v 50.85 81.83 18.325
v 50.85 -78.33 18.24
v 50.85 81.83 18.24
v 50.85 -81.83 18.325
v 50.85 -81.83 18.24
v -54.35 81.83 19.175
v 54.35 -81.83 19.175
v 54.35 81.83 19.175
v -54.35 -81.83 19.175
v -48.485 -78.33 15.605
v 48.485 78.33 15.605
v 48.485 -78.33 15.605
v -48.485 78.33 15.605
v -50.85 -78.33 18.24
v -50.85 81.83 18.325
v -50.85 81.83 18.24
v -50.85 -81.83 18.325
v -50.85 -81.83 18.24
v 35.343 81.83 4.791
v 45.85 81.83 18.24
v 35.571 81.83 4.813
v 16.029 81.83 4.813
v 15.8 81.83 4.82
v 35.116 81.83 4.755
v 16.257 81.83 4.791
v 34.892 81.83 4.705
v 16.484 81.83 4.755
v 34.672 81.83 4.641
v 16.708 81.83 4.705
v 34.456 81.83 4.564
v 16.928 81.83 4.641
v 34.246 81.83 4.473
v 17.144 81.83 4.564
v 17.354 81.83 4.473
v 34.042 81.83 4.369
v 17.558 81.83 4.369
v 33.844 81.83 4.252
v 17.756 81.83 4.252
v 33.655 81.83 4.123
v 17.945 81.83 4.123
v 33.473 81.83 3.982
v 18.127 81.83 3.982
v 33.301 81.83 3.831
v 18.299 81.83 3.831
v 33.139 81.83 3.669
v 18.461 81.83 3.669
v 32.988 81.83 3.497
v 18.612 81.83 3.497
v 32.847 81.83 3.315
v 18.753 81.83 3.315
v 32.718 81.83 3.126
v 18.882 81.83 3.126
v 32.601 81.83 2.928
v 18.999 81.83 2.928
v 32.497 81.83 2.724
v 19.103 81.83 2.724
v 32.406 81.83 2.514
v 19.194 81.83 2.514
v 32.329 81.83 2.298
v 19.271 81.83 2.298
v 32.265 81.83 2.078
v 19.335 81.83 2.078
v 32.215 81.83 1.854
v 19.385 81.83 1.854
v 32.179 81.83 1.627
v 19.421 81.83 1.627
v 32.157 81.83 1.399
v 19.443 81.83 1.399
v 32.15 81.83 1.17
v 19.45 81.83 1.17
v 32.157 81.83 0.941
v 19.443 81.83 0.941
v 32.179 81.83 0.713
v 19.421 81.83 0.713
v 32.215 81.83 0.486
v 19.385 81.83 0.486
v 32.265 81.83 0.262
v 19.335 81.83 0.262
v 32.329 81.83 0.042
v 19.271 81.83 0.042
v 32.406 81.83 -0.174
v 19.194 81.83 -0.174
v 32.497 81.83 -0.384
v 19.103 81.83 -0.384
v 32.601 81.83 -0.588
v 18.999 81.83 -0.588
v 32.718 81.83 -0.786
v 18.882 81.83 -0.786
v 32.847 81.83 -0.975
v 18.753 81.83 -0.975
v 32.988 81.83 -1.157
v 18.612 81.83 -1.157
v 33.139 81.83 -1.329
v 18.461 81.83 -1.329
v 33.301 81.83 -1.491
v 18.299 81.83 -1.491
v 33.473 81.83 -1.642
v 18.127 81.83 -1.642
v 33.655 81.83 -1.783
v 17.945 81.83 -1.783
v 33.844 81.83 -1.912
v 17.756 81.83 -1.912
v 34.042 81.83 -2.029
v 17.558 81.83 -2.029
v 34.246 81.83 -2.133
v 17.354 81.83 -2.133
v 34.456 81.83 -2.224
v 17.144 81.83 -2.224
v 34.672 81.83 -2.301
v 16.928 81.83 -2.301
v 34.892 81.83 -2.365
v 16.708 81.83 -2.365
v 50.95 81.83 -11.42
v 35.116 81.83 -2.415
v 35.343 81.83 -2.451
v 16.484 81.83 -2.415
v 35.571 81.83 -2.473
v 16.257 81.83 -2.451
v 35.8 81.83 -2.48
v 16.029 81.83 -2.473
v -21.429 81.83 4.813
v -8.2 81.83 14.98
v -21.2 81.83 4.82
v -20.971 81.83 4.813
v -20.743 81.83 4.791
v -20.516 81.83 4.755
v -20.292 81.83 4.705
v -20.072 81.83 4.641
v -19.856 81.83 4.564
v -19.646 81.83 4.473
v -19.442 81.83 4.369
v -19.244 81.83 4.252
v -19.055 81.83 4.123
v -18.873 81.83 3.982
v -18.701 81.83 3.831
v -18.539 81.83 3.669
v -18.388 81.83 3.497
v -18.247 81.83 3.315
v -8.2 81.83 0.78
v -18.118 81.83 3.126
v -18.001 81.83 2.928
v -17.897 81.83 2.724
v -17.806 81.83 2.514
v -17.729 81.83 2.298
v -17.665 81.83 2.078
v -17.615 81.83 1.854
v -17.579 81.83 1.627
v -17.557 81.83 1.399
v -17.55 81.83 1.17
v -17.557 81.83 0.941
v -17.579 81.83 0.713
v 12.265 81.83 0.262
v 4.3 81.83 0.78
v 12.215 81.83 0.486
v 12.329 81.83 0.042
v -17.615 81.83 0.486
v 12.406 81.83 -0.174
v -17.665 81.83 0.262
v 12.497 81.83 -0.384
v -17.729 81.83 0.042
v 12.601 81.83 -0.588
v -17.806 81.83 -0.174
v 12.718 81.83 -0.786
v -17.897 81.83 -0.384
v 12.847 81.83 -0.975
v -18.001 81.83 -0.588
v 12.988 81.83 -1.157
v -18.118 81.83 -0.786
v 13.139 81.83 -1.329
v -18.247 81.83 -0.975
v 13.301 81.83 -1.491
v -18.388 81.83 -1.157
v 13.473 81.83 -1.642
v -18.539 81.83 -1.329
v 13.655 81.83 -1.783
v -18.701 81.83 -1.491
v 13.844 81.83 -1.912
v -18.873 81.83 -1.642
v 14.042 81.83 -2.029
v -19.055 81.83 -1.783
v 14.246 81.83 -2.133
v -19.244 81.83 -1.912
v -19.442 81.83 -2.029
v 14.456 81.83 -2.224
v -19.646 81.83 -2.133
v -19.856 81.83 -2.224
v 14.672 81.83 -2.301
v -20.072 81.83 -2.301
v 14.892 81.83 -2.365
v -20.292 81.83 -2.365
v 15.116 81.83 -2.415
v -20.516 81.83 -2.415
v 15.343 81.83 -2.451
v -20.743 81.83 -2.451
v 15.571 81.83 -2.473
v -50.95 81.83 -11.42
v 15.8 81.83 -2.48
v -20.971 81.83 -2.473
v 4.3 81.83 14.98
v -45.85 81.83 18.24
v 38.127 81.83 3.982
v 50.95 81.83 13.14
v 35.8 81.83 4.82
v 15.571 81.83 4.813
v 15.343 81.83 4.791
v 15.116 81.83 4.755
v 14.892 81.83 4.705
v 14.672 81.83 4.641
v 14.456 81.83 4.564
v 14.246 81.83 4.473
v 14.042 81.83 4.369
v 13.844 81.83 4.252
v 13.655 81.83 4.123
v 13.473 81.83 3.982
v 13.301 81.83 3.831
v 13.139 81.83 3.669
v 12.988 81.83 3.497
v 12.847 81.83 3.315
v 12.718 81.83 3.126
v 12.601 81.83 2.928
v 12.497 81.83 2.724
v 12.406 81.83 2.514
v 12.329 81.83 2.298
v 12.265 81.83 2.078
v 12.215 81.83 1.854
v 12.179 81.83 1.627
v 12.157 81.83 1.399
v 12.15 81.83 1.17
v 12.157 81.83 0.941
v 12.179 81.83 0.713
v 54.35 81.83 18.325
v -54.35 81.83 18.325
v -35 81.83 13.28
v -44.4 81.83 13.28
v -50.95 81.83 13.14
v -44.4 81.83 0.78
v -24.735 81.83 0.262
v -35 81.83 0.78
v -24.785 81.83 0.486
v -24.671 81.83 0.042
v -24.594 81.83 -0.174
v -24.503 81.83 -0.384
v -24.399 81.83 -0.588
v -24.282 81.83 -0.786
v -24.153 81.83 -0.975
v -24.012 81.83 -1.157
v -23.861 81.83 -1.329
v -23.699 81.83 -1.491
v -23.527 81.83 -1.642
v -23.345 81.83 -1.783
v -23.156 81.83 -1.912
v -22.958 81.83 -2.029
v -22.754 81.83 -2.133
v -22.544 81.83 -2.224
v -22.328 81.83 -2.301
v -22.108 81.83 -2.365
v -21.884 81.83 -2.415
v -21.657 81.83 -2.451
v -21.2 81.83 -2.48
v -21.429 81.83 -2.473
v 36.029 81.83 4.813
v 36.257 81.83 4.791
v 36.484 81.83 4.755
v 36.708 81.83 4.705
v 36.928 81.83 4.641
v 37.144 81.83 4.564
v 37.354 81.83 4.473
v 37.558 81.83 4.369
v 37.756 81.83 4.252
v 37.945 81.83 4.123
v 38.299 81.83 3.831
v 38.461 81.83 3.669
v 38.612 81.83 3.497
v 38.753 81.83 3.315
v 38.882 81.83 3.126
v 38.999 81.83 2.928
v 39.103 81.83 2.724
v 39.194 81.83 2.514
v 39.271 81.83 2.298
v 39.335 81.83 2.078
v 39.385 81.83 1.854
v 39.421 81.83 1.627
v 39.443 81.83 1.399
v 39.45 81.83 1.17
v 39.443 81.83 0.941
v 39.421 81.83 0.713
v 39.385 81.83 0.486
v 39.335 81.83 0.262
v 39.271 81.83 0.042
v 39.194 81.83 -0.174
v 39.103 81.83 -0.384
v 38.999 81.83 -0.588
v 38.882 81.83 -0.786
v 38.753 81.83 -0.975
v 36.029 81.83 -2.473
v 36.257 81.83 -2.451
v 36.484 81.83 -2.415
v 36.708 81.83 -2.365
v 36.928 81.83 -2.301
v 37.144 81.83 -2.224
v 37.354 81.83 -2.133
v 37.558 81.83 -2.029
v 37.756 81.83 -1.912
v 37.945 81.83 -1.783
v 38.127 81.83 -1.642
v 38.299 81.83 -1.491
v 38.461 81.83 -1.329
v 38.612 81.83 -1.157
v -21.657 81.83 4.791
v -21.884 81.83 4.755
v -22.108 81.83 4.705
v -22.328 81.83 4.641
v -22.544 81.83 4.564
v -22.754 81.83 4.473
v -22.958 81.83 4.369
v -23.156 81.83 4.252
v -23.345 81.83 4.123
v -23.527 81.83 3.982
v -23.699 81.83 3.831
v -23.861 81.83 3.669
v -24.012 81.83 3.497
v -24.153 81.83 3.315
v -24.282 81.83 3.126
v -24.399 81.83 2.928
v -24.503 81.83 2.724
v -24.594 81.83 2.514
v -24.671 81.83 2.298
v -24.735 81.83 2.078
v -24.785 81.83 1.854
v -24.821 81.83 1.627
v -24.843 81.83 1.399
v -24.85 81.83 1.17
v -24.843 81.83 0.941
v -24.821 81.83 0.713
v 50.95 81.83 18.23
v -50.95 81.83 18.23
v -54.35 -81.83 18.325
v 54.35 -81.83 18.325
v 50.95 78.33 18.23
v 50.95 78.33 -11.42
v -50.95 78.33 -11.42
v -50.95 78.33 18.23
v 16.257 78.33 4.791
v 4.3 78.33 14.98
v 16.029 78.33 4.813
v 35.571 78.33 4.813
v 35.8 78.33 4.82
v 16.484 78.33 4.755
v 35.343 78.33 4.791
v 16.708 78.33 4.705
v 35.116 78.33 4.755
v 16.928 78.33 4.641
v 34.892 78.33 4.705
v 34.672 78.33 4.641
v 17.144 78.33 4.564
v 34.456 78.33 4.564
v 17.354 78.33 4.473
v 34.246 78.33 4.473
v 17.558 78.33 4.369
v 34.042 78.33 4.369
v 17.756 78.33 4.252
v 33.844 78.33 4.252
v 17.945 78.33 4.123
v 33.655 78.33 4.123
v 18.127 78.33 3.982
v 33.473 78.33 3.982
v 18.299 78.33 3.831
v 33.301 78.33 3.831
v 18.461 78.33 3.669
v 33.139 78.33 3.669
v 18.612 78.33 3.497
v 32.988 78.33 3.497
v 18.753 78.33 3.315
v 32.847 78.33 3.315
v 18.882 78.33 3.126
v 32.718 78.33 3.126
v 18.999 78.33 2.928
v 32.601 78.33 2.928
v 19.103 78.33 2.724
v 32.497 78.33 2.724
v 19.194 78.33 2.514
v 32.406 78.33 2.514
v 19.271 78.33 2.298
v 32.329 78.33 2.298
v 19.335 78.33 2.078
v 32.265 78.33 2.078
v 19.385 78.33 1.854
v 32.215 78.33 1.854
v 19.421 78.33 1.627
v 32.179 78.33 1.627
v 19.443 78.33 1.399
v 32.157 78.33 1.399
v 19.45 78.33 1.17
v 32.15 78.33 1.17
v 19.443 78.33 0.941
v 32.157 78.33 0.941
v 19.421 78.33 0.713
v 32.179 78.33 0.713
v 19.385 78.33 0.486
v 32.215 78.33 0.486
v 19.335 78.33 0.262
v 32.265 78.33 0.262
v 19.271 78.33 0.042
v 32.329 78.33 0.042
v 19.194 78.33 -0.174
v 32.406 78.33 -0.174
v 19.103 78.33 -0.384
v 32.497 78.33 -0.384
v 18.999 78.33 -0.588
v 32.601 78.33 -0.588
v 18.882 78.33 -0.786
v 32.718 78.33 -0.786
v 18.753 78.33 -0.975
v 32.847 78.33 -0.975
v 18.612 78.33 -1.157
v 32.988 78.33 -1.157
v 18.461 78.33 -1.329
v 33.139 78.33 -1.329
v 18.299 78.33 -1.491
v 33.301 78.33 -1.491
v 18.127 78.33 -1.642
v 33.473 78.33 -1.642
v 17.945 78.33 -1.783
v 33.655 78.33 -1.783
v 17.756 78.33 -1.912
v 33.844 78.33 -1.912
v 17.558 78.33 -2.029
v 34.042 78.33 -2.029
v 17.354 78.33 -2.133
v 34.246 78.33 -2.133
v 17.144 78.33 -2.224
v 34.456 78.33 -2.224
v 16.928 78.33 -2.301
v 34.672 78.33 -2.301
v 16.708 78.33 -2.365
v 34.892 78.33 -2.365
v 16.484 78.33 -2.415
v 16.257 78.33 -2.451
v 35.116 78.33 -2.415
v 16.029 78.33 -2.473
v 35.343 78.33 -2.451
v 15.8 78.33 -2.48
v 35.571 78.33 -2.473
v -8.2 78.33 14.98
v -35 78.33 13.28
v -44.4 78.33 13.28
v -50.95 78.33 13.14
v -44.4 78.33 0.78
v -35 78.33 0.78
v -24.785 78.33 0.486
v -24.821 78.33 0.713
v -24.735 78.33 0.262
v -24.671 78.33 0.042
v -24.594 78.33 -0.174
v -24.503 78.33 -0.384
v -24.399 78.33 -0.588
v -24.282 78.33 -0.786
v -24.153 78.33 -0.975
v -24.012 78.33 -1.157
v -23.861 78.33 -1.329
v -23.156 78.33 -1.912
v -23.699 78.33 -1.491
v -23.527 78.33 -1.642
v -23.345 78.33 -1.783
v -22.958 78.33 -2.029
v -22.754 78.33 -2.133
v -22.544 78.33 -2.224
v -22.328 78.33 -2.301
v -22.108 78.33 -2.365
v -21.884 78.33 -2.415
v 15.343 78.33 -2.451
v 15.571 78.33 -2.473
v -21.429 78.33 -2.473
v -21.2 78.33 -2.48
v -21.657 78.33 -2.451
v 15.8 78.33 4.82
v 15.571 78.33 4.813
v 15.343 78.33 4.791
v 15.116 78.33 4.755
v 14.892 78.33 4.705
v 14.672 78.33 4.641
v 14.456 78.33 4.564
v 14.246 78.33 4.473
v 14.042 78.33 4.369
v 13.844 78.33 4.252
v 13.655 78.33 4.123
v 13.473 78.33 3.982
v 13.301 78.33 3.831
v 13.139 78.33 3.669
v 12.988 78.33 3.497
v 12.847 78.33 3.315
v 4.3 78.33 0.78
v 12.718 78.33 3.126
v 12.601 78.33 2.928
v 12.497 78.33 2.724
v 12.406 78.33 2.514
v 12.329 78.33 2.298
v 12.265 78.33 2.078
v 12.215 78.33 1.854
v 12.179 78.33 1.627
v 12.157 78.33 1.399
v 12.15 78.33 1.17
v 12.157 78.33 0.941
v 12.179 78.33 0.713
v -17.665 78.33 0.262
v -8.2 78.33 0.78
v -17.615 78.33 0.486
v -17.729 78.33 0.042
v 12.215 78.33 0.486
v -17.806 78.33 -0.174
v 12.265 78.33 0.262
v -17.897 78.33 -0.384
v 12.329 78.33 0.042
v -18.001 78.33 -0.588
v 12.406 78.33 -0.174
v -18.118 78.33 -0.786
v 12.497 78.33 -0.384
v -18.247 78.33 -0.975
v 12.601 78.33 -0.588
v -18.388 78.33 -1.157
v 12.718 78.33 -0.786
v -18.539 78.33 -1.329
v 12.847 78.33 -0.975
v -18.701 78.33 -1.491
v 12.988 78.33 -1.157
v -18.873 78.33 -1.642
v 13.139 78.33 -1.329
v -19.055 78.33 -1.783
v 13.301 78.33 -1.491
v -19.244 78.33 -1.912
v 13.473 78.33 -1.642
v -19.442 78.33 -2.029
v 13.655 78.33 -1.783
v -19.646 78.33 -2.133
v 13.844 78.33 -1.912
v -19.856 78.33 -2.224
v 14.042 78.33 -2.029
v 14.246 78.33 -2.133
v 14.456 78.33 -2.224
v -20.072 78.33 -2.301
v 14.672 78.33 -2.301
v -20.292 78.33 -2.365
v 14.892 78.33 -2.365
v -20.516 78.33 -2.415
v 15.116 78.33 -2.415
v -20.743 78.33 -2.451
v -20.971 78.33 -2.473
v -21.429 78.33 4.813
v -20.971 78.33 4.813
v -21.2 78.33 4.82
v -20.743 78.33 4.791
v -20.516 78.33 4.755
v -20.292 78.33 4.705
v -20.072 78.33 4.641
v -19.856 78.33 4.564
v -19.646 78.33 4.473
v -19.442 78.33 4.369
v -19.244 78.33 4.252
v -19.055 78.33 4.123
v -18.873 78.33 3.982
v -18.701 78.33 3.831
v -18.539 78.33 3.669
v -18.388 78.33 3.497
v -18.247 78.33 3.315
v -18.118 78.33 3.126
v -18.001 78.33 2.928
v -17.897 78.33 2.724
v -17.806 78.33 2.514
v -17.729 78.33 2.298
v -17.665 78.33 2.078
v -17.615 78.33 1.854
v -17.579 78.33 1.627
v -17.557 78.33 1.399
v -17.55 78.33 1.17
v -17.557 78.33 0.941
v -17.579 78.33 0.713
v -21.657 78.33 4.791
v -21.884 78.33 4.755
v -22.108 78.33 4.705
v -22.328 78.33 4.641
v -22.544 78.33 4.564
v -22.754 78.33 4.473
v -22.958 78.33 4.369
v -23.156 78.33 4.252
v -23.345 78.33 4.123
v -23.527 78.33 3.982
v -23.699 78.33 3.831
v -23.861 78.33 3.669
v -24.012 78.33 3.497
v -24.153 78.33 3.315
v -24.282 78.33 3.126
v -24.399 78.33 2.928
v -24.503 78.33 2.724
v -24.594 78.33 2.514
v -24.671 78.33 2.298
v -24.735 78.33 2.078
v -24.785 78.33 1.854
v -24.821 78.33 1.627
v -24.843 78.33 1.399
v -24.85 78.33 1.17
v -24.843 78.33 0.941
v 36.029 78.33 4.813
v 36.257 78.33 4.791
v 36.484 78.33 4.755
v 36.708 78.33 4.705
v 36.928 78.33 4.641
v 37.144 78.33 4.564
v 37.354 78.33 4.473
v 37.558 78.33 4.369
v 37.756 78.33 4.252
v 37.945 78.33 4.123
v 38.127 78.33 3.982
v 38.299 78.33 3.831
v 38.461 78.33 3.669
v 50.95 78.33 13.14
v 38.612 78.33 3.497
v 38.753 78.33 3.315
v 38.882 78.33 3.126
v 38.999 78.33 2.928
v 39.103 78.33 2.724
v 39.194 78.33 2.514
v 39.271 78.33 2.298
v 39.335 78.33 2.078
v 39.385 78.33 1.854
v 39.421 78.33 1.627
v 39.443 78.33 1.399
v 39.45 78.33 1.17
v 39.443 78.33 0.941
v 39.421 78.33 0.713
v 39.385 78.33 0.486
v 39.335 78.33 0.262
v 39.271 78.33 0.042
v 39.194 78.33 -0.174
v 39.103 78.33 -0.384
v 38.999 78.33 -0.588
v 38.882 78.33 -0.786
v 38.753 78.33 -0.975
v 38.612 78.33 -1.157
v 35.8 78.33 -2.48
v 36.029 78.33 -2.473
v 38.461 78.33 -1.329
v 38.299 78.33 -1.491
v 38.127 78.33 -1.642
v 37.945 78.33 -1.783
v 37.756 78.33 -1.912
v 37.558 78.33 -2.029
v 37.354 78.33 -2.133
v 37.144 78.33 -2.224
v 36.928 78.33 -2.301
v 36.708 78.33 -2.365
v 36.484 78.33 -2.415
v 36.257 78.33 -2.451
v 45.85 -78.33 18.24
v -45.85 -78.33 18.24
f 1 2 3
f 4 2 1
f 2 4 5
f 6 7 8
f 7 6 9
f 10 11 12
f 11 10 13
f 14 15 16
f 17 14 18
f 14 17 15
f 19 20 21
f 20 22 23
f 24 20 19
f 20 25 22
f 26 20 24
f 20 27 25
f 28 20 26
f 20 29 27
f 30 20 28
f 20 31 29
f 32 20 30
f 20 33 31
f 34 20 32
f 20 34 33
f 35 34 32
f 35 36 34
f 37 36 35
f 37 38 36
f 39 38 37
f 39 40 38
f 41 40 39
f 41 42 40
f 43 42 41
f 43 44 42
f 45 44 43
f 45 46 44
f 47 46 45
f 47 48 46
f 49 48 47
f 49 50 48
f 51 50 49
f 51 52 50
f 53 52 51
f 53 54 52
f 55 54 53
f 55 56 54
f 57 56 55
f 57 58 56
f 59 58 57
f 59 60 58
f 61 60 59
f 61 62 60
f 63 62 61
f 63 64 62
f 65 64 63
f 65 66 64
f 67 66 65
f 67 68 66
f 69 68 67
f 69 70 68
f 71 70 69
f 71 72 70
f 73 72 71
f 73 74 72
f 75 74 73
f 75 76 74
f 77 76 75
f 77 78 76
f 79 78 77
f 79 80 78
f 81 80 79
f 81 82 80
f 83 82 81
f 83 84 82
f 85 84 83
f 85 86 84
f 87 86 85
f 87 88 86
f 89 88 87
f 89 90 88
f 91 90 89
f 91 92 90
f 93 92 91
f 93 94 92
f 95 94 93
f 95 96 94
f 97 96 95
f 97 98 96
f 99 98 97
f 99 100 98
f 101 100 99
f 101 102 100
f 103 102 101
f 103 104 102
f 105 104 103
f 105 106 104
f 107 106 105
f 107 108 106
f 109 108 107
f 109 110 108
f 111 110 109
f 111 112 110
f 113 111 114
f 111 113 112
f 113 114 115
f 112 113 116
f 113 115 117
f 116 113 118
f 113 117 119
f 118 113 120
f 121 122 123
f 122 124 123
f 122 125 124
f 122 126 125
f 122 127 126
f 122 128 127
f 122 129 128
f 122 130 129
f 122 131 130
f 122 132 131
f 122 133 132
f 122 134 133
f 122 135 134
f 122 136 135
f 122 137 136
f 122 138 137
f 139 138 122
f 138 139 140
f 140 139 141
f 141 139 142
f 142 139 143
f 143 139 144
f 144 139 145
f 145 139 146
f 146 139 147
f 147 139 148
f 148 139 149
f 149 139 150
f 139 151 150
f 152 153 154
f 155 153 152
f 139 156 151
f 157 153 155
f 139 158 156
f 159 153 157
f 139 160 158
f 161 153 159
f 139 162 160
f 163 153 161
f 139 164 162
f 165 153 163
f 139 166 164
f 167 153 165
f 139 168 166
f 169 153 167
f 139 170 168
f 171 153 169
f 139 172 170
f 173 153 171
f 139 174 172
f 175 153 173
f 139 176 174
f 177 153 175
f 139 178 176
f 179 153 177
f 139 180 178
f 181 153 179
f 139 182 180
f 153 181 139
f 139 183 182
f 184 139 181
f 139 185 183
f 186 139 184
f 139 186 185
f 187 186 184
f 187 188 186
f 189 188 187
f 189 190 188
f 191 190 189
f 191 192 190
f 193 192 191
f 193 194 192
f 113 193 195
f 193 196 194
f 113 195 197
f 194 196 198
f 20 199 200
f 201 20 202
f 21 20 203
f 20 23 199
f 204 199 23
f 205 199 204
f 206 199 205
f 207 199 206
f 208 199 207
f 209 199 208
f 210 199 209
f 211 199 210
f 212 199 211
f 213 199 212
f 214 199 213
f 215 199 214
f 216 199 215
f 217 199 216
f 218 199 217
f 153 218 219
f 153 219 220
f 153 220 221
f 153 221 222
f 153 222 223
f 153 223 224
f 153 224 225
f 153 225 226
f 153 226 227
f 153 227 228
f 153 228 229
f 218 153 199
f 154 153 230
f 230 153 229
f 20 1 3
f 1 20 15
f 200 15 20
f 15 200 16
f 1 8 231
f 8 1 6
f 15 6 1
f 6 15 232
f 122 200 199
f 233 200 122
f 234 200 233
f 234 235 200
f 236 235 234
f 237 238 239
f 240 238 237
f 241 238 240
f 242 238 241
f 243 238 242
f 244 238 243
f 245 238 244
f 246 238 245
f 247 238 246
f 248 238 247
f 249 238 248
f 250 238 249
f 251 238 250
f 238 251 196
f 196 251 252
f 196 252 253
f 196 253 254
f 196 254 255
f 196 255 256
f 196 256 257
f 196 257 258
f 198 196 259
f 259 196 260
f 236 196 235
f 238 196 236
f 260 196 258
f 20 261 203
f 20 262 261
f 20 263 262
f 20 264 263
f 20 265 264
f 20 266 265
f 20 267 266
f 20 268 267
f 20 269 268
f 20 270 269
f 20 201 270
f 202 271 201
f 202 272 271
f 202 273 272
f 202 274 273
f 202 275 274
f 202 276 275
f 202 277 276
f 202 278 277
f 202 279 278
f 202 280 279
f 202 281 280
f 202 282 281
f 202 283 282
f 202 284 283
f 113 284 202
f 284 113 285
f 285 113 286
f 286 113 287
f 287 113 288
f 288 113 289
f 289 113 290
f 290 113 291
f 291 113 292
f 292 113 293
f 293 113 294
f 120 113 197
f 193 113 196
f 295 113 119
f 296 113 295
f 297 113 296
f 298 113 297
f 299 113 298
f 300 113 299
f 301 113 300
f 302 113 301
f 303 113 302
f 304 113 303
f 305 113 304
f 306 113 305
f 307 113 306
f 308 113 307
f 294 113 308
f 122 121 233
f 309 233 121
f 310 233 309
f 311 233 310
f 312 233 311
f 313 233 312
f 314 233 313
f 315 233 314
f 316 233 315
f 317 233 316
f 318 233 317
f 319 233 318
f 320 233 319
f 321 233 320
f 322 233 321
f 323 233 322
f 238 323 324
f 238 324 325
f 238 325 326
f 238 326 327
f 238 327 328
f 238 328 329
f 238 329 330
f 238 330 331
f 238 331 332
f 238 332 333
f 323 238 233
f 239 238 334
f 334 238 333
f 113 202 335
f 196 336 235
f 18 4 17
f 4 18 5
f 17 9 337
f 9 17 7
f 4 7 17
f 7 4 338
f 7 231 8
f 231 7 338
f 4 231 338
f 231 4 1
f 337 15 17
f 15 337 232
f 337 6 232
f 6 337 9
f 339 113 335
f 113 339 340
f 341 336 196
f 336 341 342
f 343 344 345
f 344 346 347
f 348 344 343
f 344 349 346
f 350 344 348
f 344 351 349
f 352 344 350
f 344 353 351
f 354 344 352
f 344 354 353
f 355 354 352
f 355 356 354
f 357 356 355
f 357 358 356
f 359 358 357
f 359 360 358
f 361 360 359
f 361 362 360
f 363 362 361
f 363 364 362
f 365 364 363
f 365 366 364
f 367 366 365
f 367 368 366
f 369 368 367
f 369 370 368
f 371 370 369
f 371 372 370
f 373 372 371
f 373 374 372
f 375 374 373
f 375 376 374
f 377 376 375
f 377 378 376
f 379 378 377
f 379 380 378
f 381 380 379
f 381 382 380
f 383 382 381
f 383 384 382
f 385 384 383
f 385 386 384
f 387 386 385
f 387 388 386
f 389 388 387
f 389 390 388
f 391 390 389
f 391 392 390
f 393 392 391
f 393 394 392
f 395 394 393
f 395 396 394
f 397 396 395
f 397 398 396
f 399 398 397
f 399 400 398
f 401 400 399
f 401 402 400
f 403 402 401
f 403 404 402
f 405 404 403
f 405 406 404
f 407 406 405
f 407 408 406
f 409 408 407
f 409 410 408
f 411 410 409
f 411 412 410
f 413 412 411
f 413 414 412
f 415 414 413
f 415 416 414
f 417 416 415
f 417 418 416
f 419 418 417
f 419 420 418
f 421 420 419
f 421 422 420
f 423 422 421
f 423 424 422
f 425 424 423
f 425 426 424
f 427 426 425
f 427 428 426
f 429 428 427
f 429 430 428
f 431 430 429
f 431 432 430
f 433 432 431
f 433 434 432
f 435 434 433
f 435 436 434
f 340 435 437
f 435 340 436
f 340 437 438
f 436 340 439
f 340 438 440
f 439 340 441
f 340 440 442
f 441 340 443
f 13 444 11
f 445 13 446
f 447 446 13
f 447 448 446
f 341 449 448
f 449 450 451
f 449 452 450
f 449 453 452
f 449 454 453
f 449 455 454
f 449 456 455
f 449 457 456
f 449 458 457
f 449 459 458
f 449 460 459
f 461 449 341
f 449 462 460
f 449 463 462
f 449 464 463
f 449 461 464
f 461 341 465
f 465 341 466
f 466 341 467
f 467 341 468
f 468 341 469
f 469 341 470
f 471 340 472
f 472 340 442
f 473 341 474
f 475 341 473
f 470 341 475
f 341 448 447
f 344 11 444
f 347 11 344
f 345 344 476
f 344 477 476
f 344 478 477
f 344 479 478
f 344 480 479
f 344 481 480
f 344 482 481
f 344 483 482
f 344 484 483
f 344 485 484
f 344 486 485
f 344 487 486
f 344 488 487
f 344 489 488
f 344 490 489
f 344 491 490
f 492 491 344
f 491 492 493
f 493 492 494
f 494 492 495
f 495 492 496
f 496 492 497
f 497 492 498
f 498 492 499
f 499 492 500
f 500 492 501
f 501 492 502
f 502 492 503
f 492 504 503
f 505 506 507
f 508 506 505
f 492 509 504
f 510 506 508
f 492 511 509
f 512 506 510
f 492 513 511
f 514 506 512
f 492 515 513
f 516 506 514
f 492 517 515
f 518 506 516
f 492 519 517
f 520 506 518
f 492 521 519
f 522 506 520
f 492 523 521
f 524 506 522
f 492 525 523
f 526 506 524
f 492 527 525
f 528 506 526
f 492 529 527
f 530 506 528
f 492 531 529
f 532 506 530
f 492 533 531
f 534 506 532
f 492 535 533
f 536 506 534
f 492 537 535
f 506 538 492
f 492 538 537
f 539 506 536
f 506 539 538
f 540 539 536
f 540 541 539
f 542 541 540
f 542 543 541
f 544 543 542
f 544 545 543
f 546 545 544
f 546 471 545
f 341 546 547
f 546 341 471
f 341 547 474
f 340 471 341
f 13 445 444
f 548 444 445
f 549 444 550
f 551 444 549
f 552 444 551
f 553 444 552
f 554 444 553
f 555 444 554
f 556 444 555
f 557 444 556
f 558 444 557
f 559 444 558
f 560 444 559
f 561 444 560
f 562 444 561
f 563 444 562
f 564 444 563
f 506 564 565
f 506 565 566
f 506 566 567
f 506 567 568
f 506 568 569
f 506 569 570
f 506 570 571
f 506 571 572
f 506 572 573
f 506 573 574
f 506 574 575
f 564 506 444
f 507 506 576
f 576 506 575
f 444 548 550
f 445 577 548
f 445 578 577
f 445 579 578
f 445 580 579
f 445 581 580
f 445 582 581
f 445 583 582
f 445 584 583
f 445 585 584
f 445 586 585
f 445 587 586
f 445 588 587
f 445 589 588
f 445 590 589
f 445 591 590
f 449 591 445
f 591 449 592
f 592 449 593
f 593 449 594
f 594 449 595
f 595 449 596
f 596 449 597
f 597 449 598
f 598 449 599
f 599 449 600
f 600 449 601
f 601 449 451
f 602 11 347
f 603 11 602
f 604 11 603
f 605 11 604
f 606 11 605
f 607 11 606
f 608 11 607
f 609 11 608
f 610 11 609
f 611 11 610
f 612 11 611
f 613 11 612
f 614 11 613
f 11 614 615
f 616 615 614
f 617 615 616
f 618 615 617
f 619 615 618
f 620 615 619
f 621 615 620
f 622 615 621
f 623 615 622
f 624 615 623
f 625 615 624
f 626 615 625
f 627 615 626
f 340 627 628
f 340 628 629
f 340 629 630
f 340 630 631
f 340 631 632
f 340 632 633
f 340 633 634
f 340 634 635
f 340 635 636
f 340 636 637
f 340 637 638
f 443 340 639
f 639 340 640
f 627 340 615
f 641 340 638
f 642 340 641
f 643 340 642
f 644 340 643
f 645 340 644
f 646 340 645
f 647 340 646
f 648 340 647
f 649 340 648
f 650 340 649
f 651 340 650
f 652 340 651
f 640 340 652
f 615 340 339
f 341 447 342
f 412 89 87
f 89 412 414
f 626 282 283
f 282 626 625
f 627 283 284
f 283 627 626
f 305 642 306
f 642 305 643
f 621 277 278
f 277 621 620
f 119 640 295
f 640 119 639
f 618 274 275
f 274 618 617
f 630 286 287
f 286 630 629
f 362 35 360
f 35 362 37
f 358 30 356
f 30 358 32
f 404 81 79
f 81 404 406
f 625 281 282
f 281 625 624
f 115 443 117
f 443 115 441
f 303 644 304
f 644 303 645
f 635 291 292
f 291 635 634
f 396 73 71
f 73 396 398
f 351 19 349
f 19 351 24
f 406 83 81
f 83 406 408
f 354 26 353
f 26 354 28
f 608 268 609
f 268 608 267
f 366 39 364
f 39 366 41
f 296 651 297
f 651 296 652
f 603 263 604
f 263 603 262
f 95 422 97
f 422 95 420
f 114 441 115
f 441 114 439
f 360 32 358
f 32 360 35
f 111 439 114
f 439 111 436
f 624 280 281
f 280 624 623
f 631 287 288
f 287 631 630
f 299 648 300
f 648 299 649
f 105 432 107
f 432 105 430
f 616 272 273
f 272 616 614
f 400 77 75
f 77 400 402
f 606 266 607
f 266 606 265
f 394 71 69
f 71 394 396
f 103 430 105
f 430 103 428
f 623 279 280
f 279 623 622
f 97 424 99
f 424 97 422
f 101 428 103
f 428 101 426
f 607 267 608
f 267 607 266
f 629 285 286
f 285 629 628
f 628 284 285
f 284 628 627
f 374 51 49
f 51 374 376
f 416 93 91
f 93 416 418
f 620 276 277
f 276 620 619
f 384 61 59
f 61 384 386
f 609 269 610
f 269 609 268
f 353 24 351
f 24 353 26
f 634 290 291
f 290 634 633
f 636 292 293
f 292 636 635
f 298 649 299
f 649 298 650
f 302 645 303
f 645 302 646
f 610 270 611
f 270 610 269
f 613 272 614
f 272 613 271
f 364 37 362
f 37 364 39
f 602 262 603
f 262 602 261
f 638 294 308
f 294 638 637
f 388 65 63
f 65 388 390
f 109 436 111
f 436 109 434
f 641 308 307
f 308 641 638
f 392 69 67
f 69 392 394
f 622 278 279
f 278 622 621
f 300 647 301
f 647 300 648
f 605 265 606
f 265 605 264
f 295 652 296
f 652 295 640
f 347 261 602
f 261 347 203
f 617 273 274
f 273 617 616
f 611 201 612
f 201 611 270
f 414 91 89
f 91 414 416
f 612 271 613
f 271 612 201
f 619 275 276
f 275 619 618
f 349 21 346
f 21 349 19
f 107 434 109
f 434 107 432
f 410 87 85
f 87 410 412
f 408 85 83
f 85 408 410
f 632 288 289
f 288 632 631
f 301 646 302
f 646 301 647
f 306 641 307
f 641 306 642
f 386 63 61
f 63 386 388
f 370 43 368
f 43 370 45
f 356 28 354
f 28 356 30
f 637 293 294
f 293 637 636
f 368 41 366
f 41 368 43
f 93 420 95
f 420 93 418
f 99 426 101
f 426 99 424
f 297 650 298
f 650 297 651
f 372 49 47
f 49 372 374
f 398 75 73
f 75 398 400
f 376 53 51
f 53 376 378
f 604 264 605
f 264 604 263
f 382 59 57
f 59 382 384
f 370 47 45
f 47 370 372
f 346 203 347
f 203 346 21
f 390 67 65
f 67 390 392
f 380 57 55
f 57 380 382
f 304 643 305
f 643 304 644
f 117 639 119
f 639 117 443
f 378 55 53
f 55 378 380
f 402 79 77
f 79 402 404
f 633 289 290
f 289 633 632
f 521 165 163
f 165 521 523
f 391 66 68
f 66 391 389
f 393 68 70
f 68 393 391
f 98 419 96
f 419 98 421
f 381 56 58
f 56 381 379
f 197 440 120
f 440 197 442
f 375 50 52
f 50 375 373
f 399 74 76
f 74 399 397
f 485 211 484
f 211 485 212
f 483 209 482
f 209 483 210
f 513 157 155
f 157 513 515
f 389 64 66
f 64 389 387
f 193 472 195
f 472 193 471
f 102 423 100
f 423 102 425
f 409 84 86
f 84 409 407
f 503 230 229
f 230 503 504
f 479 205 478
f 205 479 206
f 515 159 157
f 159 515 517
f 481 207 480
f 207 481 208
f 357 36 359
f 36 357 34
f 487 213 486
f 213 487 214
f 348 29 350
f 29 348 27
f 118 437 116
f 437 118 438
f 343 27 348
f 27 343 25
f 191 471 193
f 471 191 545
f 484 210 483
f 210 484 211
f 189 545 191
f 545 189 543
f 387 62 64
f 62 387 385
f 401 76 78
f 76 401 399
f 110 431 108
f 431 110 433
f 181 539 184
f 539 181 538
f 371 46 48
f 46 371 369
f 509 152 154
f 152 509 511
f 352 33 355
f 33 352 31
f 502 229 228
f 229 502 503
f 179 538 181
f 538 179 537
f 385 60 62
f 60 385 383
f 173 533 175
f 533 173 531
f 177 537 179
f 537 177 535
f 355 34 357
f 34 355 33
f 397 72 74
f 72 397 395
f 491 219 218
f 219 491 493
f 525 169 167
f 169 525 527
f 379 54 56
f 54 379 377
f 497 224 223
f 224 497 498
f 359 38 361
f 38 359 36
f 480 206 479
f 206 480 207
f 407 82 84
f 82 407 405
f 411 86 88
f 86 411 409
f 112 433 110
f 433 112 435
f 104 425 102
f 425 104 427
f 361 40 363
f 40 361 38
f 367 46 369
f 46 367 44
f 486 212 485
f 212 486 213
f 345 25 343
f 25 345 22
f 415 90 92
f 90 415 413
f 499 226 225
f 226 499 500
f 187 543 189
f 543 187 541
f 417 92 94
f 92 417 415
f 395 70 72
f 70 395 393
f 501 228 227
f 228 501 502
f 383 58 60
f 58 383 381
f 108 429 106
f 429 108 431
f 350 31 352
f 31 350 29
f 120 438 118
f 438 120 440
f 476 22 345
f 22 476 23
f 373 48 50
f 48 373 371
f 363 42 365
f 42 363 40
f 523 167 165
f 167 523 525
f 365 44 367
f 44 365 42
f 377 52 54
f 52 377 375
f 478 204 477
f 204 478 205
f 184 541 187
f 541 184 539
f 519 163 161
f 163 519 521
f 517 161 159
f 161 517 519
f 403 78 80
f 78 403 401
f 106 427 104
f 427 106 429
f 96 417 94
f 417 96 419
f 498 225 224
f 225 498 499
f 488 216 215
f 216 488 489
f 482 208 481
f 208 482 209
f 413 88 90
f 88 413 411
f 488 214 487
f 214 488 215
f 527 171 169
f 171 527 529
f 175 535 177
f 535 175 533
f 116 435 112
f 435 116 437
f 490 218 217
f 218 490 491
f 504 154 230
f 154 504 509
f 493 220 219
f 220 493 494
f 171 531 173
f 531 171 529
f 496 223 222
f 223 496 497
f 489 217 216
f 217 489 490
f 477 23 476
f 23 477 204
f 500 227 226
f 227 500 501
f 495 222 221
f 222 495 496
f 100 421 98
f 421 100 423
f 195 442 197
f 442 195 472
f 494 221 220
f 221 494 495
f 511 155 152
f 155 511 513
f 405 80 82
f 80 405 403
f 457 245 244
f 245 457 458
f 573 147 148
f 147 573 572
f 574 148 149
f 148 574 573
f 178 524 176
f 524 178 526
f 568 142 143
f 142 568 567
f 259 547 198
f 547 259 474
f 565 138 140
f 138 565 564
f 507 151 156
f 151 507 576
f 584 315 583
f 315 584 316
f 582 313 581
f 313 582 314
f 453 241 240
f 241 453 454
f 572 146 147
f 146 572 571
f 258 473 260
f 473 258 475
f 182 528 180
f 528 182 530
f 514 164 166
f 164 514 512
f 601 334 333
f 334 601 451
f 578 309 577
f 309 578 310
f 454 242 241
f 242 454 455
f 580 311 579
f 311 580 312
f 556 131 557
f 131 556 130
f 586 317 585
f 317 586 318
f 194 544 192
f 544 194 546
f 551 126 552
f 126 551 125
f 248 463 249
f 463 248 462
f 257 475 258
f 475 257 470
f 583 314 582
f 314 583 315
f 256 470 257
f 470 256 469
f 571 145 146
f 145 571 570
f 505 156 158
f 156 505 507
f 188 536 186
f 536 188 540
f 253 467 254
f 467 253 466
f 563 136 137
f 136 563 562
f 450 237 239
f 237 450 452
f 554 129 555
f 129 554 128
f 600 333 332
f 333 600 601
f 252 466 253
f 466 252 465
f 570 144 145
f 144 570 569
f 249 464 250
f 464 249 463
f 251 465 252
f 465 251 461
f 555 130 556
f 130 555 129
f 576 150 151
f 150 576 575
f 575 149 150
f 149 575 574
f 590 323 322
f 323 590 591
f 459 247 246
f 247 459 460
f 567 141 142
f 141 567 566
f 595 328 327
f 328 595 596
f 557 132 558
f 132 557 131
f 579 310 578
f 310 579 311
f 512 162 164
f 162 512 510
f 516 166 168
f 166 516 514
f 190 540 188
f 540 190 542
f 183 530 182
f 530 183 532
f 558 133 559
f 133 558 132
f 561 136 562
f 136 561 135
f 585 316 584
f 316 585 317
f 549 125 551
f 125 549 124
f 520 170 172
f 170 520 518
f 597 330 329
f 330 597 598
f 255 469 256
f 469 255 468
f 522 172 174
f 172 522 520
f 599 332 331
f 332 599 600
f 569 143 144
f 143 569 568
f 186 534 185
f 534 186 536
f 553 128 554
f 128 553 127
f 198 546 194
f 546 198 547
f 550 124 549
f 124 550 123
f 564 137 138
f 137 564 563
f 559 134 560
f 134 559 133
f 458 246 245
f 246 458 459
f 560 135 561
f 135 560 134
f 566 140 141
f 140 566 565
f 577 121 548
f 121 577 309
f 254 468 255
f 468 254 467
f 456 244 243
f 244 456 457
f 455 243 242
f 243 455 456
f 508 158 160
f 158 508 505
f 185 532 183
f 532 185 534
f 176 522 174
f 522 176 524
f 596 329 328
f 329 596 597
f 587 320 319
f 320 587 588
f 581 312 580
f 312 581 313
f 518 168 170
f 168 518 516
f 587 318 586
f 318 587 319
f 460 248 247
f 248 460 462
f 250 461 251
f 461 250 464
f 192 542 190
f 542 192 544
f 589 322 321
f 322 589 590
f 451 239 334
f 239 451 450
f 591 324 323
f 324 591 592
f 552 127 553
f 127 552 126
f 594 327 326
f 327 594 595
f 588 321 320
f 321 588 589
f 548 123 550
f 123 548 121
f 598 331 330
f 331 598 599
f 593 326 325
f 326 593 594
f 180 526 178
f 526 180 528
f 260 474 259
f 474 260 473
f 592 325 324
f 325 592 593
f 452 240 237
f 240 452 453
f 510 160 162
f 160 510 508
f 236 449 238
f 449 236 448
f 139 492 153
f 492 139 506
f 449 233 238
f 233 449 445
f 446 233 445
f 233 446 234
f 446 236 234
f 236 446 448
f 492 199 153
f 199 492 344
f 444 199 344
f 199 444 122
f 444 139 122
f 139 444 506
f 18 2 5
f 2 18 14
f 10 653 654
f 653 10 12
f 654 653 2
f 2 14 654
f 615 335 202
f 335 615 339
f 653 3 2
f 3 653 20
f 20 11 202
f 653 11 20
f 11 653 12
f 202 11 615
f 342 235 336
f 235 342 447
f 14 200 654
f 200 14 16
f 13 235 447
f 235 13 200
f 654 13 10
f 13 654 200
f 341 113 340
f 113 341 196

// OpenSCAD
// Board Thickness: 1.56mm
// Board Length: 154.66mm
// Board Width: 99.9mm
// Hole Width Seperation: 93mm
// Hole Length Seperation: 120mm
// Hole Short Edge Distance: 14.5mm
// DC Jack Width: 9mm
// DC Jack Height: 11mm
// DC Jack Center From Edge: 10.25mm
// USB Jack Width: 12mm
// USB Jack Height: 12.7mm
// USB Jack Center From Edge: 48mm
// Jack Protursion: 2.9mm
// SMA protrusion: 0.5mm
// SMA Diameter: 6.3mm
// SMA Board Offset: 0.5mm
// SMA Width: 9.5mm
// SMA Height: 7.9mm
// SMA Below Board Protrusion: 2mm
// SMA Seperation: 20 mm
// SMA Antenna Board Edge: 11.6mm
// SMA GPS Board Edge: 9.4mm
// SMA PPS Board Edge: 24mm

board_width = 99.9;
board_length = 154.66;
board_thickness = 1.56;

hole_seperation_width = 93;
hole_seperation_length = 120;
hole_edge_distance = 14.5;

dc_width = 9.4;
dc_height = 12.5;
dc_length = 14.1;
dc_edge_distance = 10.25;

usb_width = 12.5;
usb_height = 14.2;
usb_length = 18.5;
usb_edge_distance = 48;

jack_protrusion = 2.8 + 2;

sma_base_thick = 1.5;
sma_length = 11;
sma_diameter = 7.3;
sma_board_offset = 0.5;
sma_width = 9.5;
sma_height = 7.9;
sma_below_board = 2;
sma_protrusion = 0.5;
sma_spacing = 20;

sma_antenna_edge = 11.6;
sma_pps_edge = 24;
sma_gps_edge = 9.4;

screw_shank_length = 12.2;
screw_shank_diameter = 2.8;

screw_port_offset = 25;
screw_padding = 2;
wall_thickness = 1.7;
side_thickness = 3.5;
edge_space = 1;

module sma(center_offset){
	translate([
		center_offset,
		board_length / 2 - (sma_base_thick / 2) + sma_protrusion,
		(-(board_thickness / 2)) + (sma_height / 2) - sma_below_board
	]){
		cube(
			size =
				[
					sma_width,
					sma_base_thick,
					sma_height
				],
			center = true
		);
		rotate([90,0,0]){
			translate([0,0,-sma_length/2]){
				cylinder(
					h = sma_length,
					r = sma_diameter / 2,
					center = true,
					$fn = 100
				);
			}
		}
	}
}

module board(){
	// PCB
	cube(
		size =
			[
				board_width,
				board_length,
				board_thickness
			],
		center = true
	);
	// DC Jack
	translate([
		(-(board_width / 2)) + dc_edge_distance,
		board_length / 2 - dc_length / 2 + jack_protrusion,
		(board_thickness / 2) + (dc_height / 2)
	]){
		cube(
			size =
				[
					dc_width,
					dc_length,
					dc_height
				],
			center = true
		);
	}
	// USB Jack
	translate([
		(-(board_width / 2)) + usb_edge_distance,
		board_length / 2 - usb_length / 2 + jack_protrusion,
		(board_thickness / 2) + (usb_height / 2)
	]){
		cube(
			size =
				[
					usb_width,
					usb_length,
					usb_height
				],
			center = true
		);
	}
	// SMA
	// GPS ANT
	sma(board_width / 2 - sma_width / 2 - sma_gps_edge);
	// 10MHz
	sma(board_width / 2 - sma_width / 2 - sma_gps_edge - sma_spacing);
	// PPS
	sma(-board_width / 2 + sma_width / 2 + sma_pps_edge);
	// Antennas
	rotate([0,0,180]){
		sma(board_width / 2 - sma_width / 2 - sma_antenna_edge);
		sma(board_width / 2 - sma_width / 2 - sma_antenna_edge - sma_spacing);
	}
}

module edge1(offset, sub=0){
	translate([0,offset,0]){
		cube(
			size =
				[
					board_width + ((edge_space + side_thickness) * 2) - sub,
					side_thickness,
					wall_thickness * 2
					+ screw_shank_length + board_thickness + usb_height
				],
			center = true
		);
	}
}

module edge2(offset){
	translate([offset,0,0]){
		cube(
			size =
				[
					side_thickness,
					board_length + ((edge_space + side_thickness) * 2),
					wall_thickness * 2
					+ screw_shank_length + board_thickness + usb_height
				],
			center = true
		);
	}
}

module screw_port(x, y){
	translate([x - (screw_shank_diameter / 2 + screw_padding),y,
		usb_height - screw_shank_length / 2 + board_thickness * 1.5 + wall_thickness - 3.5
	]){
		difference(){
			difference(){
				union(){
					cylinder(
						h = screw_shank_length + 7,
						r = screw_shank_diameter / 2 + screw_padding,
						center = true,
						$fn = 100
					);
					translate([screw_shank_diameter / 4 + screw_padding / 2,0,0]){
						cube(
							[
								screw_shank_diameter / 2 + screw_padding,
								screw_shank_diameter + screw_padding * 2,
								screw_shank_length + 7
							],
							center = true
						);
					}
				}
				cylinder(
					h = screw_shank_length + 8,
					r = screw_shank_diameter / 2,
					center = true,
					$fn = 100
				);
			}
			translate([0,0,-10.5]){
				rotate([0,-45,0]){
					cube(
						[
							screw_shank_diameter / 2 + screw_padding + 6,
							screw_shank_diameter + screw_padding * 2 + 1,
							(screw_shank_diameter + screw_padding * 2)*2+7
						],
						center = true
					);
				}
			}
		}
	}
}

module shank(x, y, z_offset = 0){
	translate([x,y,
		- wall_thickness / 2 + board_thickness / 2 - screw_shank_length / 2
	]){
		difference(){
			cylinder(
				h = screw_shank_length,
				r = screw_shank_diameter / 2 + screw_padding,
				center = true,
				$fn = 100
			);
			cylinder(
				h = screw_shank_length + 1,
				r = screw_shank_diameter / 2,
				center = true,
				$fn = 100
			);
		}
	}
}

long_edge_offset = board_length / 2 + edge_space + side_thickness / 2;
short_edge_offset = board_width / 2 + edge_space + side_thickness / 2;

module base(){
	cube(
		size =
			[
				board_width + ((edge_space + side_thickness) * 2),
				board_length + ((edge_space + side_thickness) * 2),
				wall_thickness
			],
		center = true
	);
}

module case_slide(extra_width=0){
	translate([board_width / 2 + edge_space - wall_thickness * 1.5,0,
		usb_height - wall_thickness * 0.5 + board_thickness * 1.5]){
		difference(){
			cube([
				wall_thickness * 3,
				board_length + ((edge_space + side_thickness) * 2)+extra_width,
				wall_thickness * 3
			], center = true);
			rotate([0,45,0]){
				translate([0,0,- wall_thickness * 1.5]){
					cube([
						wall_thickness * 9,
						board_length + ((edge_space + side_thickness) * 2)+1+extra_width,
						wall_thickness * 3
					], center = true);
				}
			}
		}
	}
}

module case1(){
	// Bottom
	translate([0,0,
		- wall_thickness / 2
		+ board_thickness / 2
		- screw_shank_length]
	){
		base();
	}
	// Walls
	translate([0,0,
		usb_height / 2 + board_thickness - screw_shank_length / 2
	]){
		//edge1(long_edge_offset);
		edge1(-long_edge_offset);
		edge2(short_edge_offset);
		edge2(-short_edge_offset);
	}
	// Shanks
	shank(
		hole_seperation_width / 2,
		board_length / 2 - hole_edge_distance);
	shank(
		hole_seperation_width / 2,
		board_length / 2 - hole_edge_distance - hole_seperation_length);
	shank(
		- hole_seperation_width / 2,
		board_length / 2 - hole_edge_distance);
	shank(
		-  hole_seperation_width / 2,
		board_length / 2 - hole_edge_distance - hole_seperation_length);
	// Top Holders
/*	screw_port(
		board_width / 2 + edge_space,
		board_length / 2 - screw_port_offset);
	screw_port(
		board_width / 2 + edge_space,
		-board_length / 2 + screw_port_offset - 15);
	mirror([1,0,0]){
		screw_port(
			board_width / 2 + edge_space,
			board_length / 2 - screw_port_offset);
		screw_port(
			board_width / 2 + edge_space,
			-board_length / 2 + screw_port_offset - 15);
	}*/
	case_slide();
	mirror([1,0,0]) case_slide();
}

module top1(thick, thin=0, shift=0){
	translate([0,0,
		wall_thickness * 0.5
		+ usb_height
		+ board_thickness * 1.5
		+ shift
	]){
	cube(
		size =
			[
				board_width + ((edge_space + thin) * 2 - 0.2),
				board_length + ((edge_space + side_thickness) * 2),
				thick
			],
		center = true
	);
	}
}

module case_top(){
	difference(){
		union(){
			top1(wall_thickness*2.1);
			top1(wall_thickness*0.5, side_thickness, wall_thickness*0.8);
			translate([0,long_edge_offset, + wall_thickness * 2]){
				cube(
					size =
						[
							board_width + edge_space * 2,
							side_thickness,
wall_thickness
+ screw_shank_length + board_thickness + usb_height
//							screw_shank_length + board_thickness
//							+ usb_height - side_thickness * 0.5
						],
					center = true
				);
			}
		}
		union(){
			board();
			case_bottom();
		}
	}
}

module case_bottom(){
	difference(){
		case1();
		board();
	}
}

case_top();
//board();
//case_bottom();
